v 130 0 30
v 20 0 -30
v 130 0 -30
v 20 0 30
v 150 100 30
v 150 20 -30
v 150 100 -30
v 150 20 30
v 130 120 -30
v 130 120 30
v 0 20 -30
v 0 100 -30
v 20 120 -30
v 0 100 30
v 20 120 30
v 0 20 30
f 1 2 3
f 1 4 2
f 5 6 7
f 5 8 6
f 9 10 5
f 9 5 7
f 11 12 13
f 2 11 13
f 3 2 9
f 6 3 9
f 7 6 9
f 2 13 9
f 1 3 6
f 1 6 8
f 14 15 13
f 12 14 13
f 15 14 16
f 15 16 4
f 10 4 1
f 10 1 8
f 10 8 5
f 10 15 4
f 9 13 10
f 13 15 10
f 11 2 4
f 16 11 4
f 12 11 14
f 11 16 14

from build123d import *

# Parameters (mm, degrees)
SKETCH1_W           = 150
SKETCH1_H           = 120
BOSS_EXTRUDE1_DEPTH = 30
CHAMFER1_SIZE       = 20


with BuildPart() as part:
    # Sketch1 → Boss-Extrude1 (new body, symmetric)
    with BuildSketch(Plane.XY):
        with Locations((75, 60)):
            Rectangle(SKETCH1_W, SKETCH1_H)
    extrude(amount=BOSS_EXTRUDE1_DEPTH, both=True)

    # Chamfer1
    chamfer1_edges = [part.edges().sort_by_distance(p)[0] for p in [
        (0, 120, 0),
        (150, 120, 0),
        (150, 0, 0),
        (0, 0, 0),
    ]]
    chamfer(chamfer1_edges, length=CHAMFER1_SIZE)


solid = part.part
